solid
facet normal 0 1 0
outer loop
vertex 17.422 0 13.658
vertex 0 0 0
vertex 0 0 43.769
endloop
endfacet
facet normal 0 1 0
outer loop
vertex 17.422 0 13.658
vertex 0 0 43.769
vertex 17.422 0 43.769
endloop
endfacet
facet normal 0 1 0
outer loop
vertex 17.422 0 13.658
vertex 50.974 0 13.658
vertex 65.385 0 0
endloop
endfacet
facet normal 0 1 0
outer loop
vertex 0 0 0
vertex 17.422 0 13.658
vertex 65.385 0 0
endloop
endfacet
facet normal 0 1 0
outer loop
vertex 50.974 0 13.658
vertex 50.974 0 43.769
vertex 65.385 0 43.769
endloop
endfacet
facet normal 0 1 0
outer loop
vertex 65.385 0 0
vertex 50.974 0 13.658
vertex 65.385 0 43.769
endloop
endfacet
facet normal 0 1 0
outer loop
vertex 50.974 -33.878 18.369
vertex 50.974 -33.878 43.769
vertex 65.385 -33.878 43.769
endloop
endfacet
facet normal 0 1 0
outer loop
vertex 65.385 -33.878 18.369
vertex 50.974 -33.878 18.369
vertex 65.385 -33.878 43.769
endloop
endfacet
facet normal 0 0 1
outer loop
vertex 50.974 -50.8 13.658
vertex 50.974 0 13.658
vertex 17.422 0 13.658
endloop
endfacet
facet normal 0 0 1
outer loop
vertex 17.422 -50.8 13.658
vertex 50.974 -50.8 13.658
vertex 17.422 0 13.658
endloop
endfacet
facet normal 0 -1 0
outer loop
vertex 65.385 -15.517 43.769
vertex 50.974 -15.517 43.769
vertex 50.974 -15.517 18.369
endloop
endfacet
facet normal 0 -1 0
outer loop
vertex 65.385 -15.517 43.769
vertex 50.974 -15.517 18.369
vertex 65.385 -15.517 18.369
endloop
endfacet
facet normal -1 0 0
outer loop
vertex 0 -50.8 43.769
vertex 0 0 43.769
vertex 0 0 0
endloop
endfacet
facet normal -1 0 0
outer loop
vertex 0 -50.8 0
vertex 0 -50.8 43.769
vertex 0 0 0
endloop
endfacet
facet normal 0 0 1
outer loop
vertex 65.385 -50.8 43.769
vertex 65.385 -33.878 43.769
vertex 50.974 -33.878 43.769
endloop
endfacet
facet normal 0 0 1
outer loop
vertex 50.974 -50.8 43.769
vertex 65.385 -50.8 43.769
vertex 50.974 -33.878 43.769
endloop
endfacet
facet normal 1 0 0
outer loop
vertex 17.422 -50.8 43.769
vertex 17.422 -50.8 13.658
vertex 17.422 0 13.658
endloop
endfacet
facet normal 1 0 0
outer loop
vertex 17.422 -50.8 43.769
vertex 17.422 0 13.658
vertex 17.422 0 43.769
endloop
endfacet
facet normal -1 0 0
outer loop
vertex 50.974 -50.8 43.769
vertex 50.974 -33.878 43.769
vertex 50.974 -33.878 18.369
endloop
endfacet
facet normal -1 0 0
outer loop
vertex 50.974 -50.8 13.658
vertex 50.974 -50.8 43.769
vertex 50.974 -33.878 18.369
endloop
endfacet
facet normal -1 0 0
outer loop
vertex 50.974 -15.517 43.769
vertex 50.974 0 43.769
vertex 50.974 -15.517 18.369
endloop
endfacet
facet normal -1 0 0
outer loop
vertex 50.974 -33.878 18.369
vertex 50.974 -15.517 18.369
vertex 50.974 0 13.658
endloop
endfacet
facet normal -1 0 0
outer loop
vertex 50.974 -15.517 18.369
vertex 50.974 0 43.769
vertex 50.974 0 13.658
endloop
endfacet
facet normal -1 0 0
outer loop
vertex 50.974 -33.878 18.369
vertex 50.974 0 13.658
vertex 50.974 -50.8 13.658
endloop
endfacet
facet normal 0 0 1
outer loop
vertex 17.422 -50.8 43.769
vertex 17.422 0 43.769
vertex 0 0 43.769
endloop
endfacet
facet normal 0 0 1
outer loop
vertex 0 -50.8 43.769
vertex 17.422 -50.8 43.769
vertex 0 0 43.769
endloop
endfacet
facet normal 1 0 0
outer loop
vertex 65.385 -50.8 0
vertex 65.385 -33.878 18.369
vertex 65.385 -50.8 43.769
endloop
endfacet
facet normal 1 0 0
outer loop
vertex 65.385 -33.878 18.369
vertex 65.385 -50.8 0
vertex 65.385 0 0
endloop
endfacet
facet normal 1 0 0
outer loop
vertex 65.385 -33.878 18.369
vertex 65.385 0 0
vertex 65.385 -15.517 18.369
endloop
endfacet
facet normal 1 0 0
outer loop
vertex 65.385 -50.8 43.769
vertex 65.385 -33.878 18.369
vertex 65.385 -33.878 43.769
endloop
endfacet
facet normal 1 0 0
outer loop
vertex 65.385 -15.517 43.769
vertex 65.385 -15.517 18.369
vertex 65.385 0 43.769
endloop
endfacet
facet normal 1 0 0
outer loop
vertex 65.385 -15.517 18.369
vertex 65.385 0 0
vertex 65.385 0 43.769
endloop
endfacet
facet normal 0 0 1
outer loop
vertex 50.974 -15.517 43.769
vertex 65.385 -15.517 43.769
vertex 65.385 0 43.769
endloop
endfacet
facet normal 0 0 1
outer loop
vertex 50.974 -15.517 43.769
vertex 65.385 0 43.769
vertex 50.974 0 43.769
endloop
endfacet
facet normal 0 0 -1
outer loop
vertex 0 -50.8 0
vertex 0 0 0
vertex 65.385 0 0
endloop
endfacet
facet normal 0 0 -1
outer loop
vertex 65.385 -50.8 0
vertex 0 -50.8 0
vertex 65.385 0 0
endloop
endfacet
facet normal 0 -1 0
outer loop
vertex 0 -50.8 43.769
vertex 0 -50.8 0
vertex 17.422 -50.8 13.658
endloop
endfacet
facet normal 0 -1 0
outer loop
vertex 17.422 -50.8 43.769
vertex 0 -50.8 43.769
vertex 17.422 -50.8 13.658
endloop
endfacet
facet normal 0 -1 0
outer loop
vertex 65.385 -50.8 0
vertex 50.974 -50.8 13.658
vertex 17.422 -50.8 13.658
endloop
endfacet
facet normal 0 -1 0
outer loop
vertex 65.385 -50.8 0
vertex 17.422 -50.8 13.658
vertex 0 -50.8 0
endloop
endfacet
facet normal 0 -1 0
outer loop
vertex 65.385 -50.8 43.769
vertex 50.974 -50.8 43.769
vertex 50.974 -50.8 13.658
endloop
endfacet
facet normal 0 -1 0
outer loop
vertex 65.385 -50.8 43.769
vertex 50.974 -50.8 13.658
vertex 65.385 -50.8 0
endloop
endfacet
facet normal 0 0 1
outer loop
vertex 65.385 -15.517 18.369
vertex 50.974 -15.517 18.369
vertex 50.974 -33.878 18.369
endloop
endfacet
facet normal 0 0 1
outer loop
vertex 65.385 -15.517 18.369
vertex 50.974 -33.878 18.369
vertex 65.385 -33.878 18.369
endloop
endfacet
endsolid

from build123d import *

# Parameters (mm, degrees)
F1_DEPTH = 50.8
F2_W     = 14.4103989005
F2_H     = 18.3605216444
F3_DEPTH = 25.4


with BuildPart() as f1:
    # F0 (on Front) → F1 (new body)
    with BuildSketch(Plane.XZ):
        Polygon((0, 43.7689125538), (0, 0), (65.3845146298, 0), (65.3845146298, 43.7689125538), (50.9741157293, 43.7689125538), (50.9741157293, 13.6576220393), (17.4215342849, 13.6576220393), (17.4215342849, 43.7689125538), align=None)
    extrude(amount=F1_DEPTH)

    # F2 (on face) → F3 (cut)
    with BuildSketch(Plane.XY.offset(43.7689125538)):
        with Locations((58.1793151796, -24.6975105256)):
            Rectangle(F2_W, F2_H)
    extrude(amount=-F3_DEPTH, mode=Mode.SUBTRACT)


solid = f1.part
